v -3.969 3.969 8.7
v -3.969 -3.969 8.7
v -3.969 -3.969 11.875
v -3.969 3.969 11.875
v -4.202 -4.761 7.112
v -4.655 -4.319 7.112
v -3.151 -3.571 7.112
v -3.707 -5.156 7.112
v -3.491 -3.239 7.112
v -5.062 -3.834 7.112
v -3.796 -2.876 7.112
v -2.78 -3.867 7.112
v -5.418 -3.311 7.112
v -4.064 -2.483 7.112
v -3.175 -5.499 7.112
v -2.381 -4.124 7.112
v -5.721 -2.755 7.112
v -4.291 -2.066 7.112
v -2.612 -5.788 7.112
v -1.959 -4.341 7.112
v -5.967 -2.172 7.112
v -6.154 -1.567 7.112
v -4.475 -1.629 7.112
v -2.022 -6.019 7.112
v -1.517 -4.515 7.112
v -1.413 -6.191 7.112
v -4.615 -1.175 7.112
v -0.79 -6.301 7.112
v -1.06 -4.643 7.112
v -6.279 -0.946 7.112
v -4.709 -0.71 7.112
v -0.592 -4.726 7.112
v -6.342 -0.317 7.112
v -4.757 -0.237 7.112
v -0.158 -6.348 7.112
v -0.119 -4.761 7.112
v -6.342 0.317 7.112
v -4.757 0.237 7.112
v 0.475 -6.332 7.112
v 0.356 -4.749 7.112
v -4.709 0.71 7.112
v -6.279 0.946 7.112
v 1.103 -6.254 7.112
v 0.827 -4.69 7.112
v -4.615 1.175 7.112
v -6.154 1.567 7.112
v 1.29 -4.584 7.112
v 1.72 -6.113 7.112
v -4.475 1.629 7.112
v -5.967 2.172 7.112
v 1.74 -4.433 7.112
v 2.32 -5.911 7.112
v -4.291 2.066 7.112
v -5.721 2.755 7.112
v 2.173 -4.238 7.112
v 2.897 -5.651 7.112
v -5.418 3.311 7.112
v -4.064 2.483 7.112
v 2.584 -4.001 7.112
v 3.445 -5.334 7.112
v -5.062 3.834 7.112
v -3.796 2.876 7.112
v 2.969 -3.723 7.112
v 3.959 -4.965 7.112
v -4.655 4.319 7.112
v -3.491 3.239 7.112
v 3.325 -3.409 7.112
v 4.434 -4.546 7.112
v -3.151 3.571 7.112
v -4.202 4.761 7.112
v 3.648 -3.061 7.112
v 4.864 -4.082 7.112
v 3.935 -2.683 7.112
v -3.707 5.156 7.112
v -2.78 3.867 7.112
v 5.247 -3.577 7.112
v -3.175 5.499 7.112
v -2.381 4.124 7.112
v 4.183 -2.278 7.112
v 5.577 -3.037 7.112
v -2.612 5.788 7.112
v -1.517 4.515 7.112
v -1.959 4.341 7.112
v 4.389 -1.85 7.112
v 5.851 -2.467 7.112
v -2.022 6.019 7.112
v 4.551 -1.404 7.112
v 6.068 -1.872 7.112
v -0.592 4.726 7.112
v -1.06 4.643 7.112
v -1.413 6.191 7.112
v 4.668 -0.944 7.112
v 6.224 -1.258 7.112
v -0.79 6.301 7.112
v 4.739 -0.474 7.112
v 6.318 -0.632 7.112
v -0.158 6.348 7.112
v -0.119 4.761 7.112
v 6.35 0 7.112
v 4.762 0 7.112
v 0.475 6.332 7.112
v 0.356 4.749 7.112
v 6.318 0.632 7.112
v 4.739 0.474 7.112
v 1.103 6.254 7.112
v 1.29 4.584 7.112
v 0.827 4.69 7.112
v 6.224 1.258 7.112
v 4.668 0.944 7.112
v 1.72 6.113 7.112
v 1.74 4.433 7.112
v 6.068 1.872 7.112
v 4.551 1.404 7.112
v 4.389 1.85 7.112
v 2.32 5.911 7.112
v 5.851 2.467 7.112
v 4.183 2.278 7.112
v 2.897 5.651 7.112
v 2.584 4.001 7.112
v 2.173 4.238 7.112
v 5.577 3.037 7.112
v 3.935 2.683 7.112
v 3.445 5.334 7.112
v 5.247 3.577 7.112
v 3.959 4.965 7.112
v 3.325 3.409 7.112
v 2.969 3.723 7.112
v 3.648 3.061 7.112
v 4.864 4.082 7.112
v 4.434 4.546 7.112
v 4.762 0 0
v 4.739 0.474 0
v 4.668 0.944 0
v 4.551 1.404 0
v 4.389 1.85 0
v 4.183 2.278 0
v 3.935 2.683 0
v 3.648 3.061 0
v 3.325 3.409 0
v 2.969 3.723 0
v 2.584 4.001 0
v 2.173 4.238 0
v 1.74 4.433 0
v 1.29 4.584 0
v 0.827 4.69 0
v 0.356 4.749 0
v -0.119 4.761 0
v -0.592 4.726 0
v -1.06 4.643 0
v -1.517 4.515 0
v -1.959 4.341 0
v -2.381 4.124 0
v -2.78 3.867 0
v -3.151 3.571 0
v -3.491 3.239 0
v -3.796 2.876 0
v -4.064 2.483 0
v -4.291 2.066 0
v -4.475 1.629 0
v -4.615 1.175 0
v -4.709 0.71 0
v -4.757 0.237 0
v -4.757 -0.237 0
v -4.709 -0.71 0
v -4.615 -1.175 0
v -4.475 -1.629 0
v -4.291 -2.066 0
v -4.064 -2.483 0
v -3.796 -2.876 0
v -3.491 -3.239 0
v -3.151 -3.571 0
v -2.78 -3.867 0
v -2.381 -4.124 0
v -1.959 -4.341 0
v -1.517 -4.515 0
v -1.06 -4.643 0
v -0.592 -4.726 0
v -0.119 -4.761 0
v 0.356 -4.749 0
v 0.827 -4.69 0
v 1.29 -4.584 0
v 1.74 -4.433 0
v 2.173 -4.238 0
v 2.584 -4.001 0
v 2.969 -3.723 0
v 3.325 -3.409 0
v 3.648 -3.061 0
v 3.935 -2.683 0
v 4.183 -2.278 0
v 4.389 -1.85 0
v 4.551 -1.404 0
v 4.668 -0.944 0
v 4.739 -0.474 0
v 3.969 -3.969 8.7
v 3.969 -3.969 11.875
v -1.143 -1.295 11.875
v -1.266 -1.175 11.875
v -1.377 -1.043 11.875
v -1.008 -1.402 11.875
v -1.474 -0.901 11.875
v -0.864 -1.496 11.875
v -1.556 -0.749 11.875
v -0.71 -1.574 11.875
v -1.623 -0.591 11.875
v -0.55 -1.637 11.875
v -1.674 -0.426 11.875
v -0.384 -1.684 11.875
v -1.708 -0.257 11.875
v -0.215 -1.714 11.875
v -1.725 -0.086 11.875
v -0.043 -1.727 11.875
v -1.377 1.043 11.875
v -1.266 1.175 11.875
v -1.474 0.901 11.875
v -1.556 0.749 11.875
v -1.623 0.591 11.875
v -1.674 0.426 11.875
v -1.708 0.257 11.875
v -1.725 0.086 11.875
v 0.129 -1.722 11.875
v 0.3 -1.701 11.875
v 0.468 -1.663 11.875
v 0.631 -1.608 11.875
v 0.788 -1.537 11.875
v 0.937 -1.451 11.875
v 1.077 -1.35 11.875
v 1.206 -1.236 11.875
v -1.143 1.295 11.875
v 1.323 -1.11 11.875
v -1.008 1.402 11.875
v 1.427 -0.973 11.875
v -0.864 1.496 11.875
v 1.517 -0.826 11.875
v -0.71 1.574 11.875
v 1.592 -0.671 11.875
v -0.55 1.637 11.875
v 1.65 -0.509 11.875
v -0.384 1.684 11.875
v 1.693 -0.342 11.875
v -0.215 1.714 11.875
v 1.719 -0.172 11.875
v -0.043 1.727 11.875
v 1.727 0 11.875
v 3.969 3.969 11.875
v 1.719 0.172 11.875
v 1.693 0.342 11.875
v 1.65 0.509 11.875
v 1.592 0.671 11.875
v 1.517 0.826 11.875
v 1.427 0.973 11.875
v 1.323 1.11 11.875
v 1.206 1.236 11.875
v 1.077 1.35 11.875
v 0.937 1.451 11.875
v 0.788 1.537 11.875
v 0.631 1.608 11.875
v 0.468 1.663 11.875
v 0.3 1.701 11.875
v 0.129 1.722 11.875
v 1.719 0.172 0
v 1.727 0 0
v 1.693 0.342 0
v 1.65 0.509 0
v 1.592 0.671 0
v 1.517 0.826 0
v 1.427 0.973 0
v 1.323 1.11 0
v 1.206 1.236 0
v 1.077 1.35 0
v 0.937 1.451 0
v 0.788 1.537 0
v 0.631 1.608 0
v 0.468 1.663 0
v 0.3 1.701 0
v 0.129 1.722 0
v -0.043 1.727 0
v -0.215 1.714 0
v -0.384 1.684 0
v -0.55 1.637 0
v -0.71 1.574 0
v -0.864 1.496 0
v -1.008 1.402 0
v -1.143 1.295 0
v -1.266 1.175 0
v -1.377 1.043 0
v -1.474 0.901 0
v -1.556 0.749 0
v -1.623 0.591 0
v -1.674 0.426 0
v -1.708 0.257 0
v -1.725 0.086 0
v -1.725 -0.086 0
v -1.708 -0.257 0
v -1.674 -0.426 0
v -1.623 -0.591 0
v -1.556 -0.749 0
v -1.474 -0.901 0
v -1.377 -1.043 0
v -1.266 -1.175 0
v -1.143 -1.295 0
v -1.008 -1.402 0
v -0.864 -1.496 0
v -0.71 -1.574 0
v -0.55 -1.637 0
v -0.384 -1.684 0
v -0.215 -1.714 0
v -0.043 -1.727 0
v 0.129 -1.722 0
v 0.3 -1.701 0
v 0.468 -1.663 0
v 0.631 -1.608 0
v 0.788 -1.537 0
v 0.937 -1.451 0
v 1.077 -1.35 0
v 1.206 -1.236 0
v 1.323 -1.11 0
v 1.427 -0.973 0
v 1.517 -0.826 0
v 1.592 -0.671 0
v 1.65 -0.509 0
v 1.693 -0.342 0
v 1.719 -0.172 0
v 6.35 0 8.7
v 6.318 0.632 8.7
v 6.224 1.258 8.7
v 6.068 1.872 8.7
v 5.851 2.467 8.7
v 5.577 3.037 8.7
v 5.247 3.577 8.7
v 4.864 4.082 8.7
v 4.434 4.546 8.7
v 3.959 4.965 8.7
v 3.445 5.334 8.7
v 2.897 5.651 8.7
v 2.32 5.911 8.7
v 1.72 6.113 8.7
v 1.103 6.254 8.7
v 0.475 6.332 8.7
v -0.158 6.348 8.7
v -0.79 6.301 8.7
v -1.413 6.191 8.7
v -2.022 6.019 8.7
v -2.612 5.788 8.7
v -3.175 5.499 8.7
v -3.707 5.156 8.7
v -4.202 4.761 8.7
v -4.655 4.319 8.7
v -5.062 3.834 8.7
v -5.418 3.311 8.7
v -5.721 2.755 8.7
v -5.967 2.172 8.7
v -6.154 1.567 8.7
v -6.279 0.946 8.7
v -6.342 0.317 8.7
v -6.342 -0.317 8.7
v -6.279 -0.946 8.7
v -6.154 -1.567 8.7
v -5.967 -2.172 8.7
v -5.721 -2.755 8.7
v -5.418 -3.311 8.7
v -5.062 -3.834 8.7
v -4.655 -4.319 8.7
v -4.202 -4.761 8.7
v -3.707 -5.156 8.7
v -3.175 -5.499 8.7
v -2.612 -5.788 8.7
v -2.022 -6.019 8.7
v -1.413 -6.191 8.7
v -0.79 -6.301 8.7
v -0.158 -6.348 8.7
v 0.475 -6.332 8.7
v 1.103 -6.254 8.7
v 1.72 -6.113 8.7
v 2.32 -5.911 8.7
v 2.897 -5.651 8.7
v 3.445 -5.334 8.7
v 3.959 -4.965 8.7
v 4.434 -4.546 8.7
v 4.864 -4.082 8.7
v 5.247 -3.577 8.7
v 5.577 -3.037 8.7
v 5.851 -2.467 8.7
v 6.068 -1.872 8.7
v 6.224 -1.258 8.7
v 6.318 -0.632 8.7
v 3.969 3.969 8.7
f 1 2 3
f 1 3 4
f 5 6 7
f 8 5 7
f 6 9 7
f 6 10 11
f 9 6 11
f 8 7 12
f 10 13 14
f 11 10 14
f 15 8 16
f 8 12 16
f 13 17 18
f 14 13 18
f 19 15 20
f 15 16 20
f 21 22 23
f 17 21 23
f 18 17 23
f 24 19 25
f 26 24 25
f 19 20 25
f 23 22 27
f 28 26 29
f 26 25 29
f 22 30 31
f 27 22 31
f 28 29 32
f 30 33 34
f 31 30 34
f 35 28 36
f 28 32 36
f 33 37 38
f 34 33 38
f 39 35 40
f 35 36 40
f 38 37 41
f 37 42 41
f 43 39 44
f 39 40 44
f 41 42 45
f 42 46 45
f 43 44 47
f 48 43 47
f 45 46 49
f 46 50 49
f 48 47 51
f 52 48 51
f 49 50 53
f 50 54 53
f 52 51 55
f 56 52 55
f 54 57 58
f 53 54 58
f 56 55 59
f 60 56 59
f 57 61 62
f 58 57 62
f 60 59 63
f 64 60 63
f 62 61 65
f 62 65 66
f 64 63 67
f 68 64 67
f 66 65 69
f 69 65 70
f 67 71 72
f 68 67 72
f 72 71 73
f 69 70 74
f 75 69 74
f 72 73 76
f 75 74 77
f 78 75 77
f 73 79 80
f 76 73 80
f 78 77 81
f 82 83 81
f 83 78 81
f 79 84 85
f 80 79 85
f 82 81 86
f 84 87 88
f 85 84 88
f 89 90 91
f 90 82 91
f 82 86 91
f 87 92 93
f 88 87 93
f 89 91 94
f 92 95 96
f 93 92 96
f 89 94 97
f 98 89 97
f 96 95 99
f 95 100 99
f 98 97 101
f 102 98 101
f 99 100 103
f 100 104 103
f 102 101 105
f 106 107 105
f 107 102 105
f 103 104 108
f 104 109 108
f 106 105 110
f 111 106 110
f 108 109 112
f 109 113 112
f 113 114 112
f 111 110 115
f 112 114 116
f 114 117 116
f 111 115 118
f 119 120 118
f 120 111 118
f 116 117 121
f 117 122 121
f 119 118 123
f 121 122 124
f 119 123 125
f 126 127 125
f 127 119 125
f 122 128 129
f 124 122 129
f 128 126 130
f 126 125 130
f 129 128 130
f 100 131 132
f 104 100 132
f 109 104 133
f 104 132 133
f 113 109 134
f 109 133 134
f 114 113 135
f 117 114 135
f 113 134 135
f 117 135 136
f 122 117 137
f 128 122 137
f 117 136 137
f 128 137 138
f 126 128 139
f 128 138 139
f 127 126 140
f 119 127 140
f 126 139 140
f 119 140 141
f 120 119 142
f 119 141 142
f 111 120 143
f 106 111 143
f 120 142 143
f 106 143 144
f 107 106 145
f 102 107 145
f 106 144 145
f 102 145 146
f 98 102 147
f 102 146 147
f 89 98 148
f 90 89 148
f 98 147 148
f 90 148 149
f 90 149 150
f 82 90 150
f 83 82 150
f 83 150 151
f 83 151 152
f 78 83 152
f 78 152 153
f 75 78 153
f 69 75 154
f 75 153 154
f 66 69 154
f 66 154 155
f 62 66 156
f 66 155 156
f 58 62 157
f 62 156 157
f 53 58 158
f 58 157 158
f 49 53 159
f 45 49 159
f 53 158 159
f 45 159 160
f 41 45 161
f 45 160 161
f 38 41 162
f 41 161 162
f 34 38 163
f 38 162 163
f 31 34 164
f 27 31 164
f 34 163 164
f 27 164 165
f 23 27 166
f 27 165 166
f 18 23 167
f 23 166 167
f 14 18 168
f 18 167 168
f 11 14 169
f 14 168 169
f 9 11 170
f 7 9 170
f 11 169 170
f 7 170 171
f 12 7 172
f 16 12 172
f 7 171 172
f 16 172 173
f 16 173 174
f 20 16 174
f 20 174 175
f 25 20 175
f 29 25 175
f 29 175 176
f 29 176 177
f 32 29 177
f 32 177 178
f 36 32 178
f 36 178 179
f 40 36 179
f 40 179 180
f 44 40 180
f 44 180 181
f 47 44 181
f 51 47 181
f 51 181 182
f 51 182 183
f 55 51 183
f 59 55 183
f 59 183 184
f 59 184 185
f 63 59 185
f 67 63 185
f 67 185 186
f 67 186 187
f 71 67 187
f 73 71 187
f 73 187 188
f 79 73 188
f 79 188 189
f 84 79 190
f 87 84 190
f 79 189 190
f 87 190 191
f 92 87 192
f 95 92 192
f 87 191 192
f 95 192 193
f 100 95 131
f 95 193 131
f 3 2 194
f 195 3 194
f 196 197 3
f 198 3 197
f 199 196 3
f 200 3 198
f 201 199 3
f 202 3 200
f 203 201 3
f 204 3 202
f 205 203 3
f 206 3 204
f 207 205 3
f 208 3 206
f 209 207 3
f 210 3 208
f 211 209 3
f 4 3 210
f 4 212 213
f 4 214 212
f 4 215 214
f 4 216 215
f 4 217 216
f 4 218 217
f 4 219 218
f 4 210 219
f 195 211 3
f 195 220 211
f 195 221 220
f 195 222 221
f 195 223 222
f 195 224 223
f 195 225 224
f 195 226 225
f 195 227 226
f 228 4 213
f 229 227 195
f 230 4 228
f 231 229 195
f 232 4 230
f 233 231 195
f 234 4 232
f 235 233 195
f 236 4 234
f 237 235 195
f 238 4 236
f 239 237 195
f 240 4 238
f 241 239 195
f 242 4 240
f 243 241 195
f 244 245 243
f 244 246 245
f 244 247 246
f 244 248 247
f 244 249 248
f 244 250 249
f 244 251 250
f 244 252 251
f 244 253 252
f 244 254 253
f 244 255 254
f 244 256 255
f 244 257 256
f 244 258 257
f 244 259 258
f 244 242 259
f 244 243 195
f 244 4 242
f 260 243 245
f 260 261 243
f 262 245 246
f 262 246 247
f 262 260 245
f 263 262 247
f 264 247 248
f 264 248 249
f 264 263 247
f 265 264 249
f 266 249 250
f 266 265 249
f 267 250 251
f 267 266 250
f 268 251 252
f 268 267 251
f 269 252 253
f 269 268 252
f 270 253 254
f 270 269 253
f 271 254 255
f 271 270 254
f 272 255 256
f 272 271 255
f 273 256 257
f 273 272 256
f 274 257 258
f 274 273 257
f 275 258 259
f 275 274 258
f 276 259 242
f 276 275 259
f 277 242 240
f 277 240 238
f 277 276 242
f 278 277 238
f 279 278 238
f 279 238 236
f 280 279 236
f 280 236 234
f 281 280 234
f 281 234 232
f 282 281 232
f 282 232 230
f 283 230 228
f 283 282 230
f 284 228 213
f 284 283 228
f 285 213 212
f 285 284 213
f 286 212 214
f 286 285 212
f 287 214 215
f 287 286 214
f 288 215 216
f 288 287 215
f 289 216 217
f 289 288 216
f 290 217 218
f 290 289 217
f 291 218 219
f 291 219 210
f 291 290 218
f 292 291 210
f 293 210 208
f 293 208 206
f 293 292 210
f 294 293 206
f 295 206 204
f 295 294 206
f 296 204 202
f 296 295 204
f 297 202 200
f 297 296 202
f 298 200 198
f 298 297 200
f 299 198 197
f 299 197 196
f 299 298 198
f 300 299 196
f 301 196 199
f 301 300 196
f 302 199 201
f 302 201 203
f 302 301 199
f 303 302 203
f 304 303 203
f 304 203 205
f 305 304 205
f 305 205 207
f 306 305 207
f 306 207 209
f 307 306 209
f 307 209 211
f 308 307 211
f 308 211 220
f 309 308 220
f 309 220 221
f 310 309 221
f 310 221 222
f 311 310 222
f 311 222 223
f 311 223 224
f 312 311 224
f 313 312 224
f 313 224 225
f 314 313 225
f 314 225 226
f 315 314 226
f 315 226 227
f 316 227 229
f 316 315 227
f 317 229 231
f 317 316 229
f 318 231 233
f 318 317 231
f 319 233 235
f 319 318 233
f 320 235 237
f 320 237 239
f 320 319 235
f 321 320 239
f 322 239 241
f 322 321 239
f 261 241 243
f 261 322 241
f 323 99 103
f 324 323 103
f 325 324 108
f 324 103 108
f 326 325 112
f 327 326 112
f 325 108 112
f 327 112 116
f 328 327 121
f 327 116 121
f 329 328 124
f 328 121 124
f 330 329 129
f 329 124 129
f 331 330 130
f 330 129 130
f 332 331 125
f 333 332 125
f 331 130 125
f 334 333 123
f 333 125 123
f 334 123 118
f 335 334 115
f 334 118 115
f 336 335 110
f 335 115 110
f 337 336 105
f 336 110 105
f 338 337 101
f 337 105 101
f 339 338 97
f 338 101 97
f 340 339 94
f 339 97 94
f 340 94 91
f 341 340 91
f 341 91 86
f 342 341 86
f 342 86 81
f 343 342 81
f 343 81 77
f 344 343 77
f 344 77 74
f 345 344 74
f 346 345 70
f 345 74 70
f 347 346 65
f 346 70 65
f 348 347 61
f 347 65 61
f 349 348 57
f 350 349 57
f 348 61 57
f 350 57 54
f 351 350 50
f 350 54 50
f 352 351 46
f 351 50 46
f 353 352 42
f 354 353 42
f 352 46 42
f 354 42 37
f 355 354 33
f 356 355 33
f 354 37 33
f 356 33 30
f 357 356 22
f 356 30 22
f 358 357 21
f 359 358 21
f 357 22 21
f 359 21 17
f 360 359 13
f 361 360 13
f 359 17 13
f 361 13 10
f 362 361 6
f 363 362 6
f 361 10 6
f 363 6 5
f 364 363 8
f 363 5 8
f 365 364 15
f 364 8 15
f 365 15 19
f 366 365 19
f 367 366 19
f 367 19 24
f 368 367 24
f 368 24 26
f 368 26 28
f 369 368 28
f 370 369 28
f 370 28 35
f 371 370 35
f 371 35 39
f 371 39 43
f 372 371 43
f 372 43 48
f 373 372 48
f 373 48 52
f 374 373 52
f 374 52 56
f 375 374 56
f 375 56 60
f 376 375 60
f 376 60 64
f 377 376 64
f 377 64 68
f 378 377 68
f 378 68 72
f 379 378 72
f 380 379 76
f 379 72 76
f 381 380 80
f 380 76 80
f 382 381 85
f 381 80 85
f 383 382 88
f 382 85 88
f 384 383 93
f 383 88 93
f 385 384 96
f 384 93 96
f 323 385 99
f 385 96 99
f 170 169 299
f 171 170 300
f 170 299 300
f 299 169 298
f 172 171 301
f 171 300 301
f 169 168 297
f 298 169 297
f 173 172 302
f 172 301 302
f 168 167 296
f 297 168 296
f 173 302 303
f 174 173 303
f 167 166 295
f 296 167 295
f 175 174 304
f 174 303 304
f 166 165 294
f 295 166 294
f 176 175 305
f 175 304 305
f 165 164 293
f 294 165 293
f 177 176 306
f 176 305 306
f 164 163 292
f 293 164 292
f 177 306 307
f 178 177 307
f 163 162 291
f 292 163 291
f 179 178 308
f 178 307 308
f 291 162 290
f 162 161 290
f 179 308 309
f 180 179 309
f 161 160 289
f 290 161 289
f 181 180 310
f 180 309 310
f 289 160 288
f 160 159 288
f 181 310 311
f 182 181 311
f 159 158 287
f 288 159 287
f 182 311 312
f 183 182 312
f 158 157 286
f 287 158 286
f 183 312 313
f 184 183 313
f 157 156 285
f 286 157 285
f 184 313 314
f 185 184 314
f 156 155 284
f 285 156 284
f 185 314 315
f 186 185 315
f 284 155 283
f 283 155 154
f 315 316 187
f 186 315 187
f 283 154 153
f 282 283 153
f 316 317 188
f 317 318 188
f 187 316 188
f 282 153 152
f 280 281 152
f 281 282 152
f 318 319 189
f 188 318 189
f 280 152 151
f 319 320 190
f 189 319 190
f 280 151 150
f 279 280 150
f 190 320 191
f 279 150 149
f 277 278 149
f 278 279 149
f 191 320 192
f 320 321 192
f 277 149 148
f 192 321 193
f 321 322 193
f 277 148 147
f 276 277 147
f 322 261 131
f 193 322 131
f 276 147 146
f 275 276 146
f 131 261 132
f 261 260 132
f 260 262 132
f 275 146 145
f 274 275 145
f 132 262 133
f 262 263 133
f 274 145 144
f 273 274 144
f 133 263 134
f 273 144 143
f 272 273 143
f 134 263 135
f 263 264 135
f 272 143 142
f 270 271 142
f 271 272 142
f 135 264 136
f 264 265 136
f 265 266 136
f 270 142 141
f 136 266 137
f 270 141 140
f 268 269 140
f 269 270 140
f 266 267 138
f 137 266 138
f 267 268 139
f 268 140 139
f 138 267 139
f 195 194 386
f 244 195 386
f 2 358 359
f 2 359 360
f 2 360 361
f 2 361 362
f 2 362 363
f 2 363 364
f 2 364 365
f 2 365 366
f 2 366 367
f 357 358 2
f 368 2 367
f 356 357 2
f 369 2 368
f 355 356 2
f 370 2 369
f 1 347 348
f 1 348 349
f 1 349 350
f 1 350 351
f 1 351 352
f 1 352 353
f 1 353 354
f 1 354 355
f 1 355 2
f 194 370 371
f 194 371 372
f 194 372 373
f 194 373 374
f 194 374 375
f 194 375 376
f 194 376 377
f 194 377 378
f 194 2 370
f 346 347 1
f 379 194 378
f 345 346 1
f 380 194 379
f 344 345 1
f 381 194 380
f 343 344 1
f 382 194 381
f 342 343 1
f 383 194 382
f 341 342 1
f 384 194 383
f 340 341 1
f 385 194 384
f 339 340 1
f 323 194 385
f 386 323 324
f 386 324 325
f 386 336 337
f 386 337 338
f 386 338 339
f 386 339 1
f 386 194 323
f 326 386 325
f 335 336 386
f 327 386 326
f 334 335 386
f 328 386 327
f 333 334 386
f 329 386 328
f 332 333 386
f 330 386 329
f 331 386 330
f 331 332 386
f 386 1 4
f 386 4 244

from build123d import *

# Parameters (mm, degrees)
F0_R     = 4.7625
F0_R_2   = 1.7272
F1_DEPTH = 7.112
F2_R     = 6.35
F2_R_2   = 1.7272
F3_DEPTH = 1.5875
F4_W     = 7.9375
F4_H     = 7.9375
F4_R     = 1.7272
F5_DEPTH = 3.175


with BuildPart() as f1:
    # F0 (on Top) → F1 (new body)
    with BuildSketch(Plane.XY):
        Circle(F0_R)
        Circle(F0_R_2, mode=Mode.SUBTRACT)
    extrude(amount=F1_DEPTH)

    # F2 (on face) → F3 (join)
    with BuildSketch(Plane.XY.offset(7.112)):
        Circle(F2_R)
        Circle(F2_R_2, mode=Mode.SUBTRACT)
    extrude(amount=F3_DEPTH)

    # F4 (on face) → F5 (join)
    with BuildSketch(Plane.XY.offset(8.6995)):
        Rectangle(F4_W, F4_H)
        Circle(F4_R, mode=Mode.SUBTRACT)
    extrude(amount=F5_DEPTH)


solid = f1.part
